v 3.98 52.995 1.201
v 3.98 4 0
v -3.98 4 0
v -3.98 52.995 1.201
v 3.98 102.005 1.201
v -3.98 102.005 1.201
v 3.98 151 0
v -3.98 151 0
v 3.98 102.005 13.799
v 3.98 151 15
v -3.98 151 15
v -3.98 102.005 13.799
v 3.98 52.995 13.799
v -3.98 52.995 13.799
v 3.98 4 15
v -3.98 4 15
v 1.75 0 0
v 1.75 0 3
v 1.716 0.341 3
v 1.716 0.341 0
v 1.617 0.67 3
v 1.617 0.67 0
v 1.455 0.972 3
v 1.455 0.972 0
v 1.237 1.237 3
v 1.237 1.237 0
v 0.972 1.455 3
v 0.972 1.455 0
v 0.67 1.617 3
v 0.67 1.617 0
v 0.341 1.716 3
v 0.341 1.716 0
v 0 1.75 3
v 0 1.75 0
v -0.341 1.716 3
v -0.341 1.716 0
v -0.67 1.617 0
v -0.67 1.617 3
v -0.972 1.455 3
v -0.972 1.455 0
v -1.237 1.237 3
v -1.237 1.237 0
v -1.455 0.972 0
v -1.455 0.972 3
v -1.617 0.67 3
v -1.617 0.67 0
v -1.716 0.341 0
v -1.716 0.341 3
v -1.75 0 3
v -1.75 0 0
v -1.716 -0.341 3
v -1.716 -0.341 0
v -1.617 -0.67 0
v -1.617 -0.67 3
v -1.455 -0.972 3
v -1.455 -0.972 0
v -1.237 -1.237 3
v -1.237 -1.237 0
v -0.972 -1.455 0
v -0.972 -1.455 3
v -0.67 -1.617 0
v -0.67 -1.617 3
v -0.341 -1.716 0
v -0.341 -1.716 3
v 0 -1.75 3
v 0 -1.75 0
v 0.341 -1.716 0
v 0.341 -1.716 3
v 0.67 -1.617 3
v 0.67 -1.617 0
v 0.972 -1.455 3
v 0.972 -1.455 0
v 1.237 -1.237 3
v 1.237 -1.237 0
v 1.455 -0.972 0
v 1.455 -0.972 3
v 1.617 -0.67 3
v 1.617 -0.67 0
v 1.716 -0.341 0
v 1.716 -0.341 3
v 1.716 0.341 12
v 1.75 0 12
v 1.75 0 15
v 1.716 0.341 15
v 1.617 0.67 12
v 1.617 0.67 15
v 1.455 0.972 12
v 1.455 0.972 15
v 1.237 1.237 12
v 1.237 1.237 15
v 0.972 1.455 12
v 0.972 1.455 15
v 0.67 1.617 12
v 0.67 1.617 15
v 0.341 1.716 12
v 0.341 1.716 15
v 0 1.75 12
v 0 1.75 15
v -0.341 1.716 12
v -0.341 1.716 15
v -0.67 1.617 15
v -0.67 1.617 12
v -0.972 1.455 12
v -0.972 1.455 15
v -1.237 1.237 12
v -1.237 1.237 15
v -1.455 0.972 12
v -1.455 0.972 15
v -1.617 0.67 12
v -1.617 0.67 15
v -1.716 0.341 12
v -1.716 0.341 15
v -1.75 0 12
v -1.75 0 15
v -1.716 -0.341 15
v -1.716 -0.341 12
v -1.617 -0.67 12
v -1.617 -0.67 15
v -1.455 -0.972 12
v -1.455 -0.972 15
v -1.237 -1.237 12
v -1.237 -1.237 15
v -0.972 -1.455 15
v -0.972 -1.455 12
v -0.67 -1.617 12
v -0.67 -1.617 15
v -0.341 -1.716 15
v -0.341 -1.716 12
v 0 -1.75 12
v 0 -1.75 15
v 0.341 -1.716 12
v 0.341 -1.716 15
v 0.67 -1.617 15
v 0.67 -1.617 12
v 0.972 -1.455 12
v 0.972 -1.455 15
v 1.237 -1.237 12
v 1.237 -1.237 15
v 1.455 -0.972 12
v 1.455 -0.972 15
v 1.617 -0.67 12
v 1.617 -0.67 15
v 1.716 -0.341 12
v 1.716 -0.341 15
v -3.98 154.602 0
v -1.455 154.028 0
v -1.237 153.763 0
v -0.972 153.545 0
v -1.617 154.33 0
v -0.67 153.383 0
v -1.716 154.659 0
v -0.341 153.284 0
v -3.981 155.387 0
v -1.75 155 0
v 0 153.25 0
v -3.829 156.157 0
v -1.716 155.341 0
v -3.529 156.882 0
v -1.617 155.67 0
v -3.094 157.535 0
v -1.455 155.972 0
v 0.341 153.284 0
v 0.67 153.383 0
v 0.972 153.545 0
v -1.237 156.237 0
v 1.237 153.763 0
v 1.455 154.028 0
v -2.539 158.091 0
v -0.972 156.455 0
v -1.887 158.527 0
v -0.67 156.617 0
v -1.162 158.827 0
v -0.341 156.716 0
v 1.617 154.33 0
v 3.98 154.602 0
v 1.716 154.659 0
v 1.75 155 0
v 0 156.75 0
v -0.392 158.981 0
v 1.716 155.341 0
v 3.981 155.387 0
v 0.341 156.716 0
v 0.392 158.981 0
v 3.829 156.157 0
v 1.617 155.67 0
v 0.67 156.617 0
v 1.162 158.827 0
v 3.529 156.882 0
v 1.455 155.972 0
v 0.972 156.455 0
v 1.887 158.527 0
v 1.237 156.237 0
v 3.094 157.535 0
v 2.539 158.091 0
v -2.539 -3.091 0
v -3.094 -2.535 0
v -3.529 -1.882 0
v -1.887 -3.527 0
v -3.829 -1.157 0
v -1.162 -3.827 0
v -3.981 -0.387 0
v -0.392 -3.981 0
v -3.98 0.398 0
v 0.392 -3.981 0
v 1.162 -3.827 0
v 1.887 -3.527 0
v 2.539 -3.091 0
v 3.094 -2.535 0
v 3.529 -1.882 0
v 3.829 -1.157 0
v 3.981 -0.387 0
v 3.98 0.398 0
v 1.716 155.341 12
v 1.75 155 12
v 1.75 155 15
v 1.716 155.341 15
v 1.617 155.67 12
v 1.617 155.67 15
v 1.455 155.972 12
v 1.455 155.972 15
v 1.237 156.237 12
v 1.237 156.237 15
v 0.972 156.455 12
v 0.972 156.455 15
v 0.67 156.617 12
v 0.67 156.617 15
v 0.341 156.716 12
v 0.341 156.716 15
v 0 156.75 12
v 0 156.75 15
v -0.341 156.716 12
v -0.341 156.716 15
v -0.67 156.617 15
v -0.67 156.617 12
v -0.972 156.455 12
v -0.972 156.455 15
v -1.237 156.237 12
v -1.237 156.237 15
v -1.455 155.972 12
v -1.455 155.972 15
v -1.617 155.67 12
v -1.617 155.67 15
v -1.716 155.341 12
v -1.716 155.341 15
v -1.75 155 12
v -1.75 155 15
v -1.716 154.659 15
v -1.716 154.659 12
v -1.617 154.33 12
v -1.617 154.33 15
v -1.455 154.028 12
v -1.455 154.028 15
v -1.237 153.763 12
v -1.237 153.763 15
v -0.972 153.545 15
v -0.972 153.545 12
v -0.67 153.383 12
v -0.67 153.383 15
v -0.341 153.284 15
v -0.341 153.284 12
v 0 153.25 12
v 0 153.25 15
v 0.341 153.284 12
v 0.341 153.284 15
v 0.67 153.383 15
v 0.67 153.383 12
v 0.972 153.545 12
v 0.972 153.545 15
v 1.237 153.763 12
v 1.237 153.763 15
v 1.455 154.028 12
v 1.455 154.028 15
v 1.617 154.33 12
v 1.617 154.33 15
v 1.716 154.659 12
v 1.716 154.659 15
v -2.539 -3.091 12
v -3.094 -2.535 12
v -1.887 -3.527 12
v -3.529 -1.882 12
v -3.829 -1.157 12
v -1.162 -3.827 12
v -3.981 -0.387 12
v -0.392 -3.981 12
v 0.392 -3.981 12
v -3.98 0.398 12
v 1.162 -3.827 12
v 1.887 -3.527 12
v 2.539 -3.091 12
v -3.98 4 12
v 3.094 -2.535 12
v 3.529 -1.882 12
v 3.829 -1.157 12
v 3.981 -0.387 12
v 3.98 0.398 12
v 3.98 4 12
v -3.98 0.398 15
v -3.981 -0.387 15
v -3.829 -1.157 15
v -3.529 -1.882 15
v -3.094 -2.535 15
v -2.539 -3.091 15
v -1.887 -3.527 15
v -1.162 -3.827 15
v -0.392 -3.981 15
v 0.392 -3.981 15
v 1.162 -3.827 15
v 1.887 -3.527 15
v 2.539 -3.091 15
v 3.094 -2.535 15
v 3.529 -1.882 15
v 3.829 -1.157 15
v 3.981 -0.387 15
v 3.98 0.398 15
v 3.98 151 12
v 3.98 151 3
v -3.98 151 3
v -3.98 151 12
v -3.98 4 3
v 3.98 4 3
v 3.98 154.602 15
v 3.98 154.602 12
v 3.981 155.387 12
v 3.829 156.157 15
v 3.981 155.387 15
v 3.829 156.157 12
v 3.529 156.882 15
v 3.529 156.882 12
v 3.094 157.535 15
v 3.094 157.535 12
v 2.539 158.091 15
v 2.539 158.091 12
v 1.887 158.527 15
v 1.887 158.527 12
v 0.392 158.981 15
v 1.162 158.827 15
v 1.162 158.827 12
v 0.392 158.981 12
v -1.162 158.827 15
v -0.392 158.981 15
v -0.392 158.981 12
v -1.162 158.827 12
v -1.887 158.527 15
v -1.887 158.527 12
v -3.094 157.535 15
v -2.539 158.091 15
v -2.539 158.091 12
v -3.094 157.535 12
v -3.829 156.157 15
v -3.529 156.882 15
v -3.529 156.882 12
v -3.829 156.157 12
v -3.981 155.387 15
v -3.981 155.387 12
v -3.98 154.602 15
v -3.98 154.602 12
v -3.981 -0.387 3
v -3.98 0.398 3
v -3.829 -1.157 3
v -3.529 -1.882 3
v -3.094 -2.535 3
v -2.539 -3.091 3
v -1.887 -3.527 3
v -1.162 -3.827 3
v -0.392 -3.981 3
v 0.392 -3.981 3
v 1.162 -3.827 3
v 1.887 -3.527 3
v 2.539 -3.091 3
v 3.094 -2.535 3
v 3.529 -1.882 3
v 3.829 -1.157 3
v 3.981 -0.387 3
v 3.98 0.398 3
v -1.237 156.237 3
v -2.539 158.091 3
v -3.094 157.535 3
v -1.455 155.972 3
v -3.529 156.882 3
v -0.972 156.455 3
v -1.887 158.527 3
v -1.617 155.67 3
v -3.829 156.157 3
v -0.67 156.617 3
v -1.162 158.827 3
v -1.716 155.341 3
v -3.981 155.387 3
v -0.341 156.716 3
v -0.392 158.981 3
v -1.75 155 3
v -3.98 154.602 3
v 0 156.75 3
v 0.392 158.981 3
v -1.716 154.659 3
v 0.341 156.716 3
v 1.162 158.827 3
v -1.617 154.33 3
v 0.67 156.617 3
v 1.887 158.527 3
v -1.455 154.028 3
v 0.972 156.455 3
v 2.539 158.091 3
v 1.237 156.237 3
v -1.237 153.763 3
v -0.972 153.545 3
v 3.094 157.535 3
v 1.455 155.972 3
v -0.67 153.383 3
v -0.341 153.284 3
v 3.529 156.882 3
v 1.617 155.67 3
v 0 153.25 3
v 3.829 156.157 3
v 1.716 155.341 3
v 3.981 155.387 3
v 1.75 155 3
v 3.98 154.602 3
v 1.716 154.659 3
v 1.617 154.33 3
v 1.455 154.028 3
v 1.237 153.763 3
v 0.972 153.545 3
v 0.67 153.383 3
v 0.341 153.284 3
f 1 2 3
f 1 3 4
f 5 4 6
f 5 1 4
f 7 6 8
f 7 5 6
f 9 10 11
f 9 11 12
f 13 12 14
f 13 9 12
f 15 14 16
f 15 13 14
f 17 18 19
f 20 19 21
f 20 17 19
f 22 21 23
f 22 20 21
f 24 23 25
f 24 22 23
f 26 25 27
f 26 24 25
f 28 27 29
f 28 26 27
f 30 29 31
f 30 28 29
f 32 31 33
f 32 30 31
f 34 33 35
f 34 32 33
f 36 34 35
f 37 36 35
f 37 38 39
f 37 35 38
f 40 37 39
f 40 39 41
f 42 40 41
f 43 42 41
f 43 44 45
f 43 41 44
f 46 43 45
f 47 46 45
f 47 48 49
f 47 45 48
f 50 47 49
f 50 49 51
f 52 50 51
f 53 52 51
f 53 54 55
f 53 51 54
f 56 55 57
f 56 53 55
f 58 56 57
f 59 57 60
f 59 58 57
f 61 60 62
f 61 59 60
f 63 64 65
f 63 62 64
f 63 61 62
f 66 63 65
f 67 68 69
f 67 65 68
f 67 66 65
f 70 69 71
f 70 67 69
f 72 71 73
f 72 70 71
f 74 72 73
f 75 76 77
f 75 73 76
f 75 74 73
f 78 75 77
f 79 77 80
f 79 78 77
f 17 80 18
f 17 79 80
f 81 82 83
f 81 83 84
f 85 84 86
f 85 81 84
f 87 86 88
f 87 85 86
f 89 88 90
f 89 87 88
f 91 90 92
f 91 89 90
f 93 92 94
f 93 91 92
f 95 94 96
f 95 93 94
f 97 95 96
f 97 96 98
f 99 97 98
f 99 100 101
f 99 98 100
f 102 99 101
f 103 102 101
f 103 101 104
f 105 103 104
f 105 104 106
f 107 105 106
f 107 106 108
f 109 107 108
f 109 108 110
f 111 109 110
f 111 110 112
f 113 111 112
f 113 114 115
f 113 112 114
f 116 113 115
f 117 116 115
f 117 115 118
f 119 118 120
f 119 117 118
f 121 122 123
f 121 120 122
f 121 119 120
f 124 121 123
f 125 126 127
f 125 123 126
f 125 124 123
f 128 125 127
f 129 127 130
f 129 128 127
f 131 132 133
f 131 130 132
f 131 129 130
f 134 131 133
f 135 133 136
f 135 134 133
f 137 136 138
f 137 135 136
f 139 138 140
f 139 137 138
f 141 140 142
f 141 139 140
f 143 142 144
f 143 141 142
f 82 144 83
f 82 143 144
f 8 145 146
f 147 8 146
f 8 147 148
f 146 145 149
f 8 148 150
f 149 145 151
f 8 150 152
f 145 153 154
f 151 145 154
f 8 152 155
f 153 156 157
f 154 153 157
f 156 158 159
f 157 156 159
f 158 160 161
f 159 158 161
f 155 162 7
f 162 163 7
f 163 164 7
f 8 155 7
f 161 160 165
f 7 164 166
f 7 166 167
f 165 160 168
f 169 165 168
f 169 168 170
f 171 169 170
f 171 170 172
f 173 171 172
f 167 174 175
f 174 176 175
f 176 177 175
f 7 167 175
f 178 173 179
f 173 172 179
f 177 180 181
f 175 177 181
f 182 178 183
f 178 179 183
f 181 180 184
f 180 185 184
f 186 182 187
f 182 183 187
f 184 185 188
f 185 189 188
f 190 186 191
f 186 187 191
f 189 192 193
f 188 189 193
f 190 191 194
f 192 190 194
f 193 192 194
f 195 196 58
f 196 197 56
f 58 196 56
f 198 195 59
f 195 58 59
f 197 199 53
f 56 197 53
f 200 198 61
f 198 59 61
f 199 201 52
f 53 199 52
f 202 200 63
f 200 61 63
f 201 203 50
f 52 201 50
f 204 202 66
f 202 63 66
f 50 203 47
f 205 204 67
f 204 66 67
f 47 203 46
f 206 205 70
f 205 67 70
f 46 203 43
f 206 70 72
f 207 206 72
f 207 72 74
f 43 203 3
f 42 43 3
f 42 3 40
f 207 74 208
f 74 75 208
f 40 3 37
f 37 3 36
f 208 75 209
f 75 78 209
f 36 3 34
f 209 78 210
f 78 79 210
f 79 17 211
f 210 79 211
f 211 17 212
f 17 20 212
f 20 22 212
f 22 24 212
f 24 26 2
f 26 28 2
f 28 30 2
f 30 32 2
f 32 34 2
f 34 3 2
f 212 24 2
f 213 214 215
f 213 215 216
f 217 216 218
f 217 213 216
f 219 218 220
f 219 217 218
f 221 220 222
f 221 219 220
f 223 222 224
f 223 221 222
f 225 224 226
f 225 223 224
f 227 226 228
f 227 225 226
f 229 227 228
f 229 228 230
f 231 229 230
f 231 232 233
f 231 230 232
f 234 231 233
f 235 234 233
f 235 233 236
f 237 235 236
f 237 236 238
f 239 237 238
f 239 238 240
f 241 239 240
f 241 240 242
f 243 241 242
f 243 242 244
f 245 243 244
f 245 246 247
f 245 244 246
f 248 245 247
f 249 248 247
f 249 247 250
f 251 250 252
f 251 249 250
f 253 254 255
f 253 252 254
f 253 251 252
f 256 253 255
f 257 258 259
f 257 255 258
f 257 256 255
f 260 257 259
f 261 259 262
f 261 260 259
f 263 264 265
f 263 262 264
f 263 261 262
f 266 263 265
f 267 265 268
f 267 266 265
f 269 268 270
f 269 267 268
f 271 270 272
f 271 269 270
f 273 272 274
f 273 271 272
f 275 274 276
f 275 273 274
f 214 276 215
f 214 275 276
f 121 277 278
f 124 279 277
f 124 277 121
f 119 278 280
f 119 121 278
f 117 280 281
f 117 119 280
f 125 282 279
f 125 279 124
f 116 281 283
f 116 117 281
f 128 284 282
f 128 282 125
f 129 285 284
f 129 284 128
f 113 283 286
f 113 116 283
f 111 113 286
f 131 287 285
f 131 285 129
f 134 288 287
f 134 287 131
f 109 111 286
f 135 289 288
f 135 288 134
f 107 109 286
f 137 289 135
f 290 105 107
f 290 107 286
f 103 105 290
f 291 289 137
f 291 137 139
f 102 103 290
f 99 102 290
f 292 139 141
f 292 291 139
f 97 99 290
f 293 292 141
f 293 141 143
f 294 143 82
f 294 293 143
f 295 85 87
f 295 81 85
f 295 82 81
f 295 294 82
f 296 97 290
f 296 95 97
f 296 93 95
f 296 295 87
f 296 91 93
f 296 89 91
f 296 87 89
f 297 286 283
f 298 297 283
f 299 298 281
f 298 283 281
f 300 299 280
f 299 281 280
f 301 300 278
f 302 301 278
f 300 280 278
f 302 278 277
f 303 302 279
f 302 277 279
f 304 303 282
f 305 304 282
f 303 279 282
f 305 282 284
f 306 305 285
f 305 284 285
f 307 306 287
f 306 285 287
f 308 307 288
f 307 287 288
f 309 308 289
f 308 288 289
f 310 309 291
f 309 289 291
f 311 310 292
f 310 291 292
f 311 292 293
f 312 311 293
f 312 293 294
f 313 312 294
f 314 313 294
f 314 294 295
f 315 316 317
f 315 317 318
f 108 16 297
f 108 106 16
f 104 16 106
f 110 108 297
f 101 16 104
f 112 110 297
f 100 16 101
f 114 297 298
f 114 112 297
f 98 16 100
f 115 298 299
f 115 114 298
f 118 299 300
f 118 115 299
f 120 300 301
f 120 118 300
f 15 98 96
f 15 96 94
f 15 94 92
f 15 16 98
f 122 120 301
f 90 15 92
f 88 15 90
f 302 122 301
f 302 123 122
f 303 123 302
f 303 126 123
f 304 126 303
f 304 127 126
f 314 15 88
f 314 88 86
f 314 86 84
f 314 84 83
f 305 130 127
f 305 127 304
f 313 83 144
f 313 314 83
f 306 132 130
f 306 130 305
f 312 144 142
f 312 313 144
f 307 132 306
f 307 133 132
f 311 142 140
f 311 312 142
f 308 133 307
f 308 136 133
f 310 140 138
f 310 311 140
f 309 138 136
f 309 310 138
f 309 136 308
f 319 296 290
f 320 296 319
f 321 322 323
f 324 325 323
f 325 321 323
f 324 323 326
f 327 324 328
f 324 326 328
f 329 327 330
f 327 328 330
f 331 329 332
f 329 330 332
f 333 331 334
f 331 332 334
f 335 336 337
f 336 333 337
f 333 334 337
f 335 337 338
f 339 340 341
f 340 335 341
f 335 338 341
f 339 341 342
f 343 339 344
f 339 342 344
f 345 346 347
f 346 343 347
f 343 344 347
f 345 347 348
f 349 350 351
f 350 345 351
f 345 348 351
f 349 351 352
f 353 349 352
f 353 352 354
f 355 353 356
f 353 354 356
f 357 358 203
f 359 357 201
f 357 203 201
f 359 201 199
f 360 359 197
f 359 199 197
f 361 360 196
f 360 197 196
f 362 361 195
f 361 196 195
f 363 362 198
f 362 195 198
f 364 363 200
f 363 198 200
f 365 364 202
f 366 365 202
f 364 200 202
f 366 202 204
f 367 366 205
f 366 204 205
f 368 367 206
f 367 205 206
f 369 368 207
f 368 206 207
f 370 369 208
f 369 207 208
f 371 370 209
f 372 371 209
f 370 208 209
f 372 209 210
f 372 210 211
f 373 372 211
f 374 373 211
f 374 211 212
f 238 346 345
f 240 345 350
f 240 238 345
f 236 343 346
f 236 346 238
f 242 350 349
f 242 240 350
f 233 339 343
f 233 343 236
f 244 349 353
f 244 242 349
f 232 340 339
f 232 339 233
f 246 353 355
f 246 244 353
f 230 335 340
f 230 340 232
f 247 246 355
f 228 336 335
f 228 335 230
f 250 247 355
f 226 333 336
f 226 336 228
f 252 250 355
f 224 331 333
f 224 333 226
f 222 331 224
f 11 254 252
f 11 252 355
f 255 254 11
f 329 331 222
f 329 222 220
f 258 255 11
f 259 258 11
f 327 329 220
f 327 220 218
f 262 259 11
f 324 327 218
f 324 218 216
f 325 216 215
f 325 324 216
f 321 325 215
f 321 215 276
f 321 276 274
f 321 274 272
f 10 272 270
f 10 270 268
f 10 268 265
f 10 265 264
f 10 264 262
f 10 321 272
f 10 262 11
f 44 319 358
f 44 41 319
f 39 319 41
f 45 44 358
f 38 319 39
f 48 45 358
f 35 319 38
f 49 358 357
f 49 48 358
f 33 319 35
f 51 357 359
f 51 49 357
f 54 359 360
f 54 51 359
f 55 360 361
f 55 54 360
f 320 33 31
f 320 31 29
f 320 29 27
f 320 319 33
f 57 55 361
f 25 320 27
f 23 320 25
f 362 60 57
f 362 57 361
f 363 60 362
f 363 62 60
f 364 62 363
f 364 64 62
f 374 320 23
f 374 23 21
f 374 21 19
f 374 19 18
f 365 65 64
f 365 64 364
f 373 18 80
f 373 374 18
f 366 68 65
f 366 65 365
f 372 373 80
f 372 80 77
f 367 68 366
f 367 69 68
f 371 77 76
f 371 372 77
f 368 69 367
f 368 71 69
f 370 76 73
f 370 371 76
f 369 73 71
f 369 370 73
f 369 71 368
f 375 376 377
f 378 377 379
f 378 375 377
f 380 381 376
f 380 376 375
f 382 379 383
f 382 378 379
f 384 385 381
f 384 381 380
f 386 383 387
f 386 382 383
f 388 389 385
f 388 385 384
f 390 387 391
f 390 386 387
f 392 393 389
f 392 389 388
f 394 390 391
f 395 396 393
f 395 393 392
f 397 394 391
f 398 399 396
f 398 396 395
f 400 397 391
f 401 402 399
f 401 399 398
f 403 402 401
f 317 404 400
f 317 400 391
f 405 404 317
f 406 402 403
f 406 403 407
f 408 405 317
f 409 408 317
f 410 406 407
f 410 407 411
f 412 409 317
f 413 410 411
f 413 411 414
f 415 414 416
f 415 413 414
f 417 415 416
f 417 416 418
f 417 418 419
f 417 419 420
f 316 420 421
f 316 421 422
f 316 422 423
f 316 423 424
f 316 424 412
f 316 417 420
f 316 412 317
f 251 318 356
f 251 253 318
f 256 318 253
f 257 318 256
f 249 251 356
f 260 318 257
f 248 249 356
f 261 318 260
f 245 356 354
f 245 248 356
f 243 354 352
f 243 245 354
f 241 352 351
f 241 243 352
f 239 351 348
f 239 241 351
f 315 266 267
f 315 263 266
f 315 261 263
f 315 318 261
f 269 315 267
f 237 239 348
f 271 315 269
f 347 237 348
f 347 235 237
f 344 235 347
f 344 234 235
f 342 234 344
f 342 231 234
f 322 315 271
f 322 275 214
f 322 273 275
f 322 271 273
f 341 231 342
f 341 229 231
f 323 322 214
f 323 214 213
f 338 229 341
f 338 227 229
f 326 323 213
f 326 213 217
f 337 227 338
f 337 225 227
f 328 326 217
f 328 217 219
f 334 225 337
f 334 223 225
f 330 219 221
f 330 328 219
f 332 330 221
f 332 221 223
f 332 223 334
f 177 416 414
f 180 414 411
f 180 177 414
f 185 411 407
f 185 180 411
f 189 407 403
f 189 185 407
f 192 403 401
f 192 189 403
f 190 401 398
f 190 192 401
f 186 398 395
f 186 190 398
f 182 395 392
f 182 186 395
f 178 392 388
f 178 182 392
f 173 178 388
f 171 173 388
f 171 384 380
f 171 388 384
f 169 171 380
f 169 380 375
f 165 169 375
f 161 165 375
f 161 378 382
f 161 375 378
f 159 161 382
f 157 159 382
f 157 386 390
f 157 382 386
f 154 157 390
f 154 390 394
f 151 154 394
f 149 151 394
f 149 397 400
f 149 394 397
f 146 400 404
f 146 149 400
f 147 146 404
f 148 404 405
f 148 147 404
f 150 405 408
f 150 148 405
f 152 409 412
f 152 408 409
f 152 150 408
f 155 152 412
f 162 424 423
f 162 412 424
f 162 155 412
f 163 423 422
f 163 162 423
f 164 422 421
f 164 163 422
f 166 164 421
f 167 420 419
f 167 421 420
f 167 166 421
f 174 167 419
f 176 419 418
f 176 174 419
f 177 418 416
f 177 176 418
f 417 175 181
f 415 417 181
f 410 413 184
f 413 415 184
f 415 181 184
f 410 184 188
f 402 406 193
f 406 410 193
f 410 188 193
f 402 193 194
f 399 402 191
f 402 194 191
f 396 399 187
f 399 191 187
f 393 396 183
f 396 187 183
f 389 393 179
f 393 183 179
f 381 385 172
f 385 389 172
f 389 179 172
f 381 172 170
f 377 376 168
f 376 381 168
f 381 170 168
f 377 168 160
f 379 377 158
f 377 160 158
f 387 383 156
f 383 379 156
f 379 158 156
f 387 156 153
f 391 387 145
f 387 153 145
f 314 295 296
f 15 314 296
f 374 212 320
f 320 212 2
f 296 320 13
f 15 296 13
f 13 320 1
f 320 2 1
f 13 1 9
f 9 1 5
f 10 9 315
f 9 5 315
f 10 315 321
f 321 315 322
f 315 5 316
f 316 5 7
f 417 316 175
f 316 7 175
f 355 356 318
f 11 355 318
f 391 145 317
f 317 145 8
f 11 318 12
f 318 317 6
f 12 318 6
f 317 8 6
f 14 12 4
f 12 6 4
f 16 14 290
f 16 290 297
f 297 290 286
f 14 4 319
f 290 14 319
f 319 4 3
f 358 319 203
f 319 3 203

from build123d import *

# Parameters (mm, degrees)
F0_R     = 1.75
F1_DEPTH = 25
F3_DEPTH = 12.5


with BuildPart() as f1:
    # F0 (on Top) → F1 (new body)
    with BuildSketch(Plane.XY):
        with BuildLine():
            Line((3.980159, 0.397914), (3.980159, 154.602086))
            ThreePointArc((3.980159, 154.602086), (0, 159), (-3.980159, 154.602086))
            Line((-3.980159, 154.602086), (-3.980159, 0.397914))
            ThreePointArc((-3.980159, 0.397914), (0, -4), (3.980159, 0.397914))
        make_face()
        Circle(F0_R, mode=Mode.SUBTRACT)
        with Locations((0, 155)):
            Circle(F0_R, mode=Mode.SUBTRACT)
    extrude(amount=F1_DEPTH)

    # F2 (on Right) → F3 (intersect, symmetric)
    with BuildSketch(Plane.YZ):
        with BuildLine():
            Line((-4, 0), (0, 0))
            Line((0, 0), (4, 0))
            ThreePointArc((4, 0), (77.5, 1.351019), (151, 0))
            Line((151, 0), (159, 0))
            Line((159, 0), (159, 3))
            Line((159, 3), (151, 3))
            Line((151, 3), (151, 12))
            Line((151, 12), (159, 12))
            Line((159, 12), (159, 15))
            Line((159, 15), (151, 15))
            ThreePointArc((151, 15), (77.5, 13.648981), (4, 15))
            Line((4, 15), (-4, 15))
            Line((-4, 15), (-4, 12))
            Line((-4, 12), (4, 12))
            Line((4, 12), (4, 3))
            Line((4, 3), (-4, 3))
            Line((-4, 3), (-4, 0))
        make_face()
    extrude(amount=F3_DEPTH, both=True, mode=Mode.INTERSECT)


solid = f1.part
